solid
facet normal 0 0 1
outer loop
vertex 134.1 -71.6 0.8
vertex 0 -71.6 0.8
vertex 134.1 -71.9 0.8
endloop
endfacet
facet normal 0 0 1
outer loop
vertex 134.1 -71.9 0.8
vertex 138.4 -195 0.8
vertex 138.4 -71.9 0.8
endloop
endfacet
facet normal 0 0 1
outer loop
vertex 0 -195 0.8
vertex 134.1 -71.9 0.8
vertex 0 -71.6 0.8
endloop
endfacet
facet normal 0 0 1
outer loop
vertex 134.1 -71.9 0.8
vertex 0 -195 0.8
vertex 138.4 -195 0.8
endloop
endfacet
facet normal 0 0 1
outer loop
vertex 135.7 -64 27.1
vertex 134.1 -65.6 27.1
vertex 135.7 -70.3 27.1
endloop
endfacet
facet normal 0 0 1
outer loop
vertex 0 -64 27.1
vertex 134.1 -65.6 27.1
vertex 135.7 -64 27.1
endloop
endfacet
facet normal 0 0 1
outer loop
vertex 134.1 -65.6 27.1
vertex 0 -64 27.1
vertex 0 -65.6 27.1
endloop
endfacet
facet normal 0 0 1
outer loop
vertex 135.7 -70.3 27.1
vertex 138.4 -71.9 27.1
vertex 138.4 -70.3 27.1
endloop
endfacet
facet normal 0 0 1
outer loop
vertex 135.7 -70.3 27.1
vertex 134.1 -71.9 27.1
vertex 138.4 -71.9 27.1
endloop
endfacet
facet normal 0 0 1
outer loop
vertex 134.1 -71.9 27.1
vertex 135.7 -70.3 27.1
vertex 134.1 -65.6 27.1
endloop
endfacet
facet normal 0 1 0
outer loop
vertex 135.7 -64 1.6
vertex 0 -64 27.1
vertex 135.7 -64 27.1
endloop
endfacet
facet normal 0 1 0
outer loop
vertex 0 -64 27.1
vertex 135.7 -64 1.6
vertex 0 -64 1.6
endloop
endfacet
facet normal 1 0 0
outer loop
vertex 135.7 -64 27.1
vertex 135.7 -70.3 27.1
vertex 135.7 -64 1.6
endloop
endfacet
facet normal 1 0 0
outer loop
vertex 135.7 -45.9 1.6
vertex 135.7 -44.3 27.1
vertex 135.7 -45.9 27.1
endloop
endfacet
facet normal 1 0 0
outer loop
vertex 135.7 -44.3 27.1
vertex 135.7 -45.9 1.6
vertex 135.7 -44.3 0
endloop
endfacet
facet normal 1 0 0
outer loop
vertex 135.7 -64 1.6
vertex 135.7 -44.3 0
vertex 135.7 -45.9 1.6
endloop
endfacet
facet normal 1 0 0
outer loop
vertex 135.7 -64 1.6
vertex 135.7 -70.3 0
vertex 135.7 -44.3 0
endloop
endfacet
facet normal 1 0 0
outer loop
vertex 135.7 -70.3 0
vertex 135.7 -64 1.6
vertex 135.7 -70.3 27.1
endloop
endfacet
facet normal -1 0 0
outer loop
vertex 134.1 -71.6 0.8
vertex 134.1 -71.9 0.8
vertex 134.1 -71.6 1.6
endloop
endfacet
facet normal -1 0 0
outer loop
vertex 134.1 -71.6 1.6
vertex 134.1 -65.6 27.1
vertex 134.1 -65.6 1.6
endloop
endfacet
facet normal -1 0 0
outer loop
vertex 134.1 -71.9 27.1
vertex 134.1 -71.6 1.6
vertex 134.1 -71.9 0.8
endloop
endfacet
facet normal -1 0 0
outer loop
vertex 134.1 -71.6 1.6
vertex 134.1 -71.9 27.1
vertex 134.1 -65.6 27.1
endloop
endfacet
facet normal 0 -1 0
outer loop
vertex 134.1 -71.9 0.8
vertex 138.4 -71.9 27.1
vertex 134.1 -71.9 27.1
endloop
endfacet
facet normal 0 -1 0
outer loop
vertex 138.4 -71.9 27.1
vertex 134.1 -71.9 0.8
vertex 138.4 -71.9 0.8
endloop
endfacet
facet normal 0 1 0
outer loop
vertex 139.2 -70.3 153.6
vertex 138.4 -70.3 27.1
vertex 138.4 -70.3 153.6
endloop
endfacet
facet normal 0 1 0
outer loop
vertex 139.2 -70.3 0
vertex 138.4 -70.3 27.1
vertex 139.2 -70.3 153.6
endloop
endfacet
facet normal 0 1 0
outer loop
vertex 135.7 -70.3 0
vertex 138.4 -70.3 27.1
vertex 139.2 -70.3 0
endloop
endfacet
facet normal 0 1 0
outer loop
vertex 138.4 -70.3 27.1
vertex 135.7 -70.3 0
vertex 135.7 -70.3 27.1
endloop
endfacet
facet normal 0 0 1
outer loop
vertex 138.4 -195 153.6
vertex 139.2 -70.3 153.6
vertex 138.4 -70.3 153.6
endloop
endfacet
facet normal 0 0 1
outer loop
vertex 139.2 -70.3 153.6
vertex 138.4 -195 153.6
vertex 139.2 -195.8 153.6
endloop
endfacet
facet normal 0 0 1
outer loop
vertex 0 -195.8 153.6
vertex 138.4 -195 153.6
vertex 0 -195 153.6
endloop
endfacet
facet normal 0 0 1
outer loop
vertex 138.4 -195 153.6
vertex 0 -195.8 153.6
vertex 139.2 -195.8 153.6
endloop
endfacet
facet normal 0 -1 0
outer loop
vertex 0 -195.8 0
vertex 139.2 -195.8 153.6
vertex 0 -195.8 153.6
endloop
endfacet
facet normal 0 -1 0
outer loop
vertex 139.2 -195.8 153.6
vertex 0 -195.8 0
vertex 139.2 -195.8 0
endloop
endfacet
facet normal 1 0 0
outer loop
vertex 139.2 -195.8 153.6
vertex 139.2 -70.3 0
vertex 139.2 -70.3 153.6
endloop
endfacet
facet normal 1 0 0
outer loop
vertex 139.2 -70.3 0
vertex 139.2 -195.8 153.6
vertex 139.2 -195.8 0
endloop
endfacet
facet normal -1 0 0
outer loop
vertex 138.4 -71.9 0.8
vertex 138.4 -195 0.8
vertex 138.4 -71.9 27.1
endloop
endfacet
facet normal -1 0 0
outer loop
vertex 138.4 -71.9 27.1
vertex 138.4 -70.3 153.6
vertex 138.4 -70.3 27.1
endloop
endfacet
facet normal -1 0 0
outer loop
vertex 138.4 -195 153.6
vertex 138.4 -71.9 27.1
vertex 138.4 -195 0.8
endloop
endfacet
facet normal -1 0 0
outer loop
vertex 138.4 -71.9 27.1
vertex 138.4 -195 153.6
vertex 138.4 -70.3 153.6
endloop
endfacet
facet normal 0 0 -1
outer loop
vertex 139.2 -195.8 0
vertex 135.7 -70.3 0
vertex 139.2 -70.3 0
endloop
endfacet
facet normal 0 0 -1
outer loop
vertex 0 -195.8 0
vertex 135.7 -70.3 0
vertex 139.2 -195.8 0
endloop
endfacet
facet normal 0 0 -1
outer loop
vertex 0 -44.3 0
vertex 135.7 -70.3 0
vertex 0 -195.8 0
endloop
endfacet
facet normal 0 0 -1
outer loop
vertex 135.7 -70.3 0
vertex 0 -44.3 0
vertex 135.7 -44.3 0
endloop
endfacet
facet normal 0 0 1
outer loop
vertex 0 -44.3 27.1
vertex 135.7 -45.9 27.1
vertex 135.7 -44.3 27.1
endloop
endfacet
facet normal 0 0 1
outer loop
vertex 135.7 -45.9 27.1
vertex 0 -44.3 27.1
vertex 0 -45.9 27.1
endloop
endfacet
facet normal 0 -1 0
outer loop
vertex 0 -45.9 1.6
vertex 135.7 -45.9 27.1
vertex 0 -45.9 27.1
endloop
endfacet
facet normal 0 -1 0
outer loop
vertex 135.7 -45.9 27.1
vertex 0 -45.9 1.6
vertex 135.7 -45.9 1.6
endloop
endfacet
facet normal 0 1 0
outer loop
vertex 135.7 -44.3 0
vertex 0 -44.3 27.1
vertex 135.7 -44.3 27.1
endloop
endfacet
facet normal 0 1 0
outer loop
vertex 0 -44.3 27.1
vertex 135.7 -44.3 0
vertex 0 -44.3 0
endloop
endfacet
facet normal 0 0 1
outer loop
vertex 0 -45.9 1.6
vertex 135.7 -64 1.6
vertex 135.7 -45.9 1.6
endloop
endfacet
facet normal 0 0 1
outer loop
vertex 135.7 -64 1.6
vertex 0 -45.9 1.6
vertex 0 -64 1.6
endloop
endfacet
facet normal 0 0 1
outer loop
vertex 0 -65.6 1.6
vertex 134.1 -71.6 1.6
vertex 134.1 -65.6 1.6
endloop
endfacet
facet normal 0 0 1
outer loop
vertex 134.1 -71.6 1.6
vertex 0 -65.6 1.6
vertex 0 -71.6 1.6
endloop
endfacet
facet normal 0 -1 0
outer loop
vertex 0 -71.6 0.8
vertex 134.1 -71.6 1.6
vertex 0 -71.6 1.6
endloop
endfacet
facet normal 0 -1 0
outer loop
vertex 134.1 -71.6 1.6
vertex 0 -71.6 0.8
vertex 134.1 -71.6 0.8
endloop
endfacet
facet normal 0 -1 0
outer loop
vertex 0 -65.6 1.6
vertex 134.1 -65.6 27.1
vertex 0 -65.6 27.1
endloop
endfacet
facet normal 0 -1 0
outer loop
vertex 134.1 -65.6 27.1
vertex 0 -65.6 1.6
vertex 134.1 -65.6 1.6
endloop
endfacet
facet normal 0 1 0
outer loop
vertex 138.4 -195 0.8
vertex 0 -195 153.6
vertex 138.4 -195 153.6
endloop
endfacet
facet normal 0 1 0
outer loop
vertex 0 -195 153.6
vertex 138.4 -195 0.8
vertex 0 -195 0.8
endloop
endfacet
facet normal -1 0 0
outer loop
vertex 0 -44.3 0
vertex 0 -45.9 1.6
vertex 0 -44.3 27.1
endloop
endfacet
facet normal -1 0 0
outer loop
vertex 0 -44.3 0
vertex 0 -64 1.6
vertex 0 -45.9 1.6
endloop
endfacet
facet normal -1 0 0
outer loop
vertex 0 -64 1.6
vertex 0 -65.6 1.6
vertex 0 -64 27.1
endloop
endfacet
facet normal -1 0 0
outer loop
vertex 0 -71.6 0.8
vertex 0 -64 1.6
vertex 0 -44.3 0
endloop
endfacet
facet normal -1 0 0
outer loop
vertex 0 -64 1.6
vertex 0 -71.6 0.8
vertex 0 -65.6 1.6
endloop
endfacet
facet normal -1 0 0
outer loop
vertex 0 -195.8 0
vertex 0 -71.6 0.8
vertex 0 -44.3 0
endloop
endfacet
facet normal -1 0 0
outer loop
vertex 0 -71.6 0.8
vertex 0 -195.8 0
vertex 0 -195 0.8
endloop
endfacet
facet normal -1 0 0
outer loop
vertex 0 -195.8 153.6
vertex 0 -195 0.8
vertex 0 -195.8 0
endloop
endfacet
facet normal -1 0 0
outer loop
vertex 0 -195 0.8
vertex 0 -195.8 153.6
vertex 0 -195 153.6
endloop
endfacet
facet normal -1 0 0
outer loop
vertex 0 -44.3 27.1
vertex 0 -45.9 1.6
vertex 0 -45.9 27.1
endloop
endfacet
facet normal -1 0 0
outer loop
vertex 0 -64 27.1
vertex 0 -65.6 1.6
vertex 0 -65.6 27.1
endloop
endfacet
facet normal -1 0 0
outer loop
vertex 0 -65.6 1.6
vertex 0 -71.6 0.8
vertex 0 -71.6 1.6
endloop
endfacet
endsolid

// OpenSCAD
// Copyright 2024 Heikki Suonsivu
// Licensed under Creative Commons CC-BY-NC-SA, see https://creativecommons.org/licenses/by-nc-sa/4.0/
// For commercial licensing, please contact directly, hsu-3d@suonsivu.net, +358 40 551 9679

include <hsu.scad>

print=2;

b=800;

xtolerance=0.3;
ytolerance=0.3;
ztolerance=0.3;

maxy=240; // 250 really, but leave some space
wall=0.8; // Just wall to block airflow, no strength
mediumwall=1.6; // Thicker wall when structural strength may be needed

baseh=58; // Under z=0
baseheight=-baseh;
basew=426;
basel=434;
basey=-273;

towerh=410;
towerw=64;
towerl=70;
towerdistance=272;
towerfreecop=19;
towerfreespaceabove=130;

echo(2*towerw+towerdistance);

topbarh=25.5;
topbarheight=towerh-18-topbarh;
topbarl=18.1; //19;
topbarfromtowerback=6;
topbary=towerl-topbarfromtowerback-topbarl;

topcoverh=150;
topcoverfrontl=160; // From back of towers
topcoverbackl=130; // From back of towers
topcoverfronty=towerl-topcoverfrontl;
topcoverbacky=towerl+topcoverbackl;
  
backw=towerdistance+wall*2+2*2; // TARKISTA CORNER
backl=195-towerl;//190-towerl;

spoolholderh=40;
spoolholderw=40;
spoolholderlength=244;
spoolholderl=8.3;
spoolholderheight=329;
spoolholderx=-towerdistance/2-towerw/2-spoolholderl/2+spoolholderw/2-spoolholderlength;

trayh=3.5;
lefttrayedgeh=45;
righttrayedgeh=25;

gantrymovement=305-55; // 333-85; //300; //250; // TARKISTA

leftboxw=72;
leftboxl=52;
leftboxh=132;
leftboxx=-35-leftboxw-towerdistance/2; // TARKISTA
leftboxy=-49;//-leftboxl;

leftboxbottomheight=12;
leftboxtopheight=leftboxbottomheight+gantrymovement; // Including left box h

filamenty=42;
filamentd=10;
filamentw=1;
filamenttubed=4;
filamenttubew=10;
filamentheight=105;

rightboxw=81.5;//74;
rightboxl=94; // y size
rightboxh=128;
rightboxx=towerdistance/2+39;

cameray=14; // camera position y size (from back)
cameraw=10;
cameral=36;
camerah=45;
cameraheight=0; // TARKISTA relative to bottom of right box

rightboxbottomheight=12;
rightboxtopheight=rightboxbottomheight+gantrymovement;
echo(rightboxtopheight);

rightboxy=-74;

printplateheight=25;
printplateh=5;
printplatew=250;
magnetplatetabl=17;
magnetplatetabw=153;
printplatel=250;
printplatefronty=-332+magnetplatetabl; // Print plate when in front position
printplatebacky=190-printplatel; // Print plate when in back position

gantryw=360;
gantryl=18.5;
gantryh=28.1;
gantrybottomheight=84.6-gantryh;
gantryy=-20.6;
gantrytopheight=gantrybottomheight+gantrymovement;

printheadw=97.5;
printheadl=65;
printheadh=101.5; // Including nozzle
printheadleftx=-35.5-towerdistance/2; // TARKISTA
printheadrightx=towerdistance/2-70.8;
printheady=gantryy-printheadl;
printheadbottomheight=printplateheight+printplateh;
printheadtopheight=printheadbottomheight+gantrymovement;

module ankermakem5() {
  translate([-basew/2,basey,baseheight]) cube([basew,basel,baseh]);

  translate([-towerdistance/2,topbary,topbarheight]) cube([towerdistance,topbarl,topbarh]);

  translate([spoolholderx,towerl,spoolholderheight]) cube([spoolholderlength,spoolholderl,spoolholderh]);
  
  translate([-towerw-towerdistance/2,0,0]) cube([towerw,towerl,towerh]);
  translate([towerdistance/2,0,0]) cube([towerw,towerl,towerh]);

  translate([-printplatew/2,printplatefronty,printplateheight]) cube([printplatew,printplatel,printplateh]);
  translate([-magnetplatetabw/2,printplatefronty-magnetplatetabl,printplateheight]) cube([magnetplatetabw,magnetplatetabl,printplateh]);

  translate([leftboxx,leftboxy,leftboxbottomheight]) cube([leftboxw,leftboxl,leftboxh]);
  
  translate([rightboxx,rightboxy,rightboxbottomheight]) cube([rightboxw,rightboxl,rightboxh]);
  translate([rightboxx-cameraw,rightboxy+cameray,rightboxbottomheight+cameraheight]) cube([cameraw,cameral,camerah]);

  translate([-gantryw/2,gantryy,gantrybottomheight]) cube([gantryw,gantryl,gantryh]);

  translate([printheadleftx,printheady,printheadbottomheight]) cube([printheadw,printheadl,printheadh]);
  
  color("yellow") {
    translate([-printplatew/2,printplatebacky,printplateheight]) cube([printplatew,printplatel,printplateh]);
  translate([-magnetplatetabw/2,printplatebacky-magnetplatetabl,printplateheight]) cube([magnetplatetabw,magnetplatetabl,printplateh]);
    
    translate([leftboxx,leftboxy,leftboxtopheight]) cube([leftboxw,leftboxl,leftboxh]);

    translate([rightboxx,rightboxy,rightboxtopheight]) cube([rightboxw,rightboxl,rightboxh]);
    translate([rightboxx-cameraw,rightboxy+cameray,rightboxtopheight+cameraheight]) cube([cameraw,cameral,camerah]);

    translate([-gantryw/2,gantryy,gantrytopheight]) cube([gantryw,gantryl,gantryh]);

    translate([printheadrightx,printheady,printheadbottomheight]) cube([printheadw,printheadl,printheadh]);
    translate([printheadleftx,printheady,printheadtopheight]) cube([printheadw,printheadl,printheadh]);
    translate([printheadrightx,printheady,printheadtopheight]) cube([printheadw,printheadl,printheadh]);
  }
}

module backcovertop() {
  // top bar
  translate([-towerdistance/2+xtolerance,topbary-mediumwall,topbarheight]) cube([towerdistance-xtolerance*2,mediumwall,topbarh+mediumwall]);
  translate([-towerdistance/2+xtolerance,topbary-mediumwall,topbarheight+topbarh]) cube([towerdistance-xtolerance*2,topbarl+mediumwall+topbarfromtowerback+mediumwall,mediumwall]);
  translate([-towerdistance/2+xtolerance,topbary+topbarl,topbarheight]) cube([towerdistance-xtolerance*2,mediumwall,topbarh+mediumwall]);

  for (x=[-towerdistance/2+xtolerance,towerdistance/2-xtolerance-mediumwall]) {
    translate([x,topbary+topbarl,topbarheight]) cube([mediumwall,topbarfromtowerback+ytolerance+mediumwall,topbarh+wall]);
  }
  
  for (x=[-backw/2-xtolerance,towerdistance/2-xtolerance-mediumwall]) {
    translate([x,topbary+topbarl+topbarfromtowerback+ytolerance,topbarheight]) cube([(backw-towerdistance)/2+mediumwall+xtolerance*2,mediumwall,topbarh+wall]);
  }
  
  translate([-backw/2-wall/2,topbary+topbarl+topbarfromtowerback+ytolerance,topbarheight+topbarh+mediumwall-wall]) cube([backw+wall,backl+wall-ytolerance,wall]);

  for (x=[-backw/2-wall/2,backw/2-wall/2]) {
    translate([x,towerl+ytolerance,maxy]) cube([wall,backl+wall-ytolerance,topbarheight+topbarh-maxy+wall]); //printheadtopheight
  }
  translate([-backw/2-wall/2,towerl+backl,maxy]) cube([backw,wall,topbarheight+topbarh-maxy+wall]);
}

module backcoverlow() {
  for (x=[-backw/2-wall/2,backw/2-wall/2]) {
    translate([x,towerl+ytolerance,0]) cube([wall,backl+wall-ytolerance,maxy]); //printheadtopheight
  }
  translate([-backw/2-wall/2,towerl+backl,0]) cube([backw,wall,maxy]);
  translate([-backw/2,basey+basel-ytolerance,0]) cube([backw,towerl+backl-(basey+basel)+ytolerance,wall]);
}

module frontcover() {
}

if (print==0) {
  ankermakem5();
  #backcovertop();
  #backcoverlow();
 }

if (print==2) {
  intersection() {
    translate([0,0,topbarheight+mediumwall+topbarh]) rotate([180,0,0]) backcovertop();
    translate([0,-b,-b]) cube([b*2,b*2,b*2]);
  }
 }

if (print==3) {
  intersection() {
    translate([0,0,topbarheight+mediumwall+topbarh]) rotate([180,0,0]) backcovertop();
    translate([-b,-b,-b]) cube([b,b*2,b*2]);
  }
 }
